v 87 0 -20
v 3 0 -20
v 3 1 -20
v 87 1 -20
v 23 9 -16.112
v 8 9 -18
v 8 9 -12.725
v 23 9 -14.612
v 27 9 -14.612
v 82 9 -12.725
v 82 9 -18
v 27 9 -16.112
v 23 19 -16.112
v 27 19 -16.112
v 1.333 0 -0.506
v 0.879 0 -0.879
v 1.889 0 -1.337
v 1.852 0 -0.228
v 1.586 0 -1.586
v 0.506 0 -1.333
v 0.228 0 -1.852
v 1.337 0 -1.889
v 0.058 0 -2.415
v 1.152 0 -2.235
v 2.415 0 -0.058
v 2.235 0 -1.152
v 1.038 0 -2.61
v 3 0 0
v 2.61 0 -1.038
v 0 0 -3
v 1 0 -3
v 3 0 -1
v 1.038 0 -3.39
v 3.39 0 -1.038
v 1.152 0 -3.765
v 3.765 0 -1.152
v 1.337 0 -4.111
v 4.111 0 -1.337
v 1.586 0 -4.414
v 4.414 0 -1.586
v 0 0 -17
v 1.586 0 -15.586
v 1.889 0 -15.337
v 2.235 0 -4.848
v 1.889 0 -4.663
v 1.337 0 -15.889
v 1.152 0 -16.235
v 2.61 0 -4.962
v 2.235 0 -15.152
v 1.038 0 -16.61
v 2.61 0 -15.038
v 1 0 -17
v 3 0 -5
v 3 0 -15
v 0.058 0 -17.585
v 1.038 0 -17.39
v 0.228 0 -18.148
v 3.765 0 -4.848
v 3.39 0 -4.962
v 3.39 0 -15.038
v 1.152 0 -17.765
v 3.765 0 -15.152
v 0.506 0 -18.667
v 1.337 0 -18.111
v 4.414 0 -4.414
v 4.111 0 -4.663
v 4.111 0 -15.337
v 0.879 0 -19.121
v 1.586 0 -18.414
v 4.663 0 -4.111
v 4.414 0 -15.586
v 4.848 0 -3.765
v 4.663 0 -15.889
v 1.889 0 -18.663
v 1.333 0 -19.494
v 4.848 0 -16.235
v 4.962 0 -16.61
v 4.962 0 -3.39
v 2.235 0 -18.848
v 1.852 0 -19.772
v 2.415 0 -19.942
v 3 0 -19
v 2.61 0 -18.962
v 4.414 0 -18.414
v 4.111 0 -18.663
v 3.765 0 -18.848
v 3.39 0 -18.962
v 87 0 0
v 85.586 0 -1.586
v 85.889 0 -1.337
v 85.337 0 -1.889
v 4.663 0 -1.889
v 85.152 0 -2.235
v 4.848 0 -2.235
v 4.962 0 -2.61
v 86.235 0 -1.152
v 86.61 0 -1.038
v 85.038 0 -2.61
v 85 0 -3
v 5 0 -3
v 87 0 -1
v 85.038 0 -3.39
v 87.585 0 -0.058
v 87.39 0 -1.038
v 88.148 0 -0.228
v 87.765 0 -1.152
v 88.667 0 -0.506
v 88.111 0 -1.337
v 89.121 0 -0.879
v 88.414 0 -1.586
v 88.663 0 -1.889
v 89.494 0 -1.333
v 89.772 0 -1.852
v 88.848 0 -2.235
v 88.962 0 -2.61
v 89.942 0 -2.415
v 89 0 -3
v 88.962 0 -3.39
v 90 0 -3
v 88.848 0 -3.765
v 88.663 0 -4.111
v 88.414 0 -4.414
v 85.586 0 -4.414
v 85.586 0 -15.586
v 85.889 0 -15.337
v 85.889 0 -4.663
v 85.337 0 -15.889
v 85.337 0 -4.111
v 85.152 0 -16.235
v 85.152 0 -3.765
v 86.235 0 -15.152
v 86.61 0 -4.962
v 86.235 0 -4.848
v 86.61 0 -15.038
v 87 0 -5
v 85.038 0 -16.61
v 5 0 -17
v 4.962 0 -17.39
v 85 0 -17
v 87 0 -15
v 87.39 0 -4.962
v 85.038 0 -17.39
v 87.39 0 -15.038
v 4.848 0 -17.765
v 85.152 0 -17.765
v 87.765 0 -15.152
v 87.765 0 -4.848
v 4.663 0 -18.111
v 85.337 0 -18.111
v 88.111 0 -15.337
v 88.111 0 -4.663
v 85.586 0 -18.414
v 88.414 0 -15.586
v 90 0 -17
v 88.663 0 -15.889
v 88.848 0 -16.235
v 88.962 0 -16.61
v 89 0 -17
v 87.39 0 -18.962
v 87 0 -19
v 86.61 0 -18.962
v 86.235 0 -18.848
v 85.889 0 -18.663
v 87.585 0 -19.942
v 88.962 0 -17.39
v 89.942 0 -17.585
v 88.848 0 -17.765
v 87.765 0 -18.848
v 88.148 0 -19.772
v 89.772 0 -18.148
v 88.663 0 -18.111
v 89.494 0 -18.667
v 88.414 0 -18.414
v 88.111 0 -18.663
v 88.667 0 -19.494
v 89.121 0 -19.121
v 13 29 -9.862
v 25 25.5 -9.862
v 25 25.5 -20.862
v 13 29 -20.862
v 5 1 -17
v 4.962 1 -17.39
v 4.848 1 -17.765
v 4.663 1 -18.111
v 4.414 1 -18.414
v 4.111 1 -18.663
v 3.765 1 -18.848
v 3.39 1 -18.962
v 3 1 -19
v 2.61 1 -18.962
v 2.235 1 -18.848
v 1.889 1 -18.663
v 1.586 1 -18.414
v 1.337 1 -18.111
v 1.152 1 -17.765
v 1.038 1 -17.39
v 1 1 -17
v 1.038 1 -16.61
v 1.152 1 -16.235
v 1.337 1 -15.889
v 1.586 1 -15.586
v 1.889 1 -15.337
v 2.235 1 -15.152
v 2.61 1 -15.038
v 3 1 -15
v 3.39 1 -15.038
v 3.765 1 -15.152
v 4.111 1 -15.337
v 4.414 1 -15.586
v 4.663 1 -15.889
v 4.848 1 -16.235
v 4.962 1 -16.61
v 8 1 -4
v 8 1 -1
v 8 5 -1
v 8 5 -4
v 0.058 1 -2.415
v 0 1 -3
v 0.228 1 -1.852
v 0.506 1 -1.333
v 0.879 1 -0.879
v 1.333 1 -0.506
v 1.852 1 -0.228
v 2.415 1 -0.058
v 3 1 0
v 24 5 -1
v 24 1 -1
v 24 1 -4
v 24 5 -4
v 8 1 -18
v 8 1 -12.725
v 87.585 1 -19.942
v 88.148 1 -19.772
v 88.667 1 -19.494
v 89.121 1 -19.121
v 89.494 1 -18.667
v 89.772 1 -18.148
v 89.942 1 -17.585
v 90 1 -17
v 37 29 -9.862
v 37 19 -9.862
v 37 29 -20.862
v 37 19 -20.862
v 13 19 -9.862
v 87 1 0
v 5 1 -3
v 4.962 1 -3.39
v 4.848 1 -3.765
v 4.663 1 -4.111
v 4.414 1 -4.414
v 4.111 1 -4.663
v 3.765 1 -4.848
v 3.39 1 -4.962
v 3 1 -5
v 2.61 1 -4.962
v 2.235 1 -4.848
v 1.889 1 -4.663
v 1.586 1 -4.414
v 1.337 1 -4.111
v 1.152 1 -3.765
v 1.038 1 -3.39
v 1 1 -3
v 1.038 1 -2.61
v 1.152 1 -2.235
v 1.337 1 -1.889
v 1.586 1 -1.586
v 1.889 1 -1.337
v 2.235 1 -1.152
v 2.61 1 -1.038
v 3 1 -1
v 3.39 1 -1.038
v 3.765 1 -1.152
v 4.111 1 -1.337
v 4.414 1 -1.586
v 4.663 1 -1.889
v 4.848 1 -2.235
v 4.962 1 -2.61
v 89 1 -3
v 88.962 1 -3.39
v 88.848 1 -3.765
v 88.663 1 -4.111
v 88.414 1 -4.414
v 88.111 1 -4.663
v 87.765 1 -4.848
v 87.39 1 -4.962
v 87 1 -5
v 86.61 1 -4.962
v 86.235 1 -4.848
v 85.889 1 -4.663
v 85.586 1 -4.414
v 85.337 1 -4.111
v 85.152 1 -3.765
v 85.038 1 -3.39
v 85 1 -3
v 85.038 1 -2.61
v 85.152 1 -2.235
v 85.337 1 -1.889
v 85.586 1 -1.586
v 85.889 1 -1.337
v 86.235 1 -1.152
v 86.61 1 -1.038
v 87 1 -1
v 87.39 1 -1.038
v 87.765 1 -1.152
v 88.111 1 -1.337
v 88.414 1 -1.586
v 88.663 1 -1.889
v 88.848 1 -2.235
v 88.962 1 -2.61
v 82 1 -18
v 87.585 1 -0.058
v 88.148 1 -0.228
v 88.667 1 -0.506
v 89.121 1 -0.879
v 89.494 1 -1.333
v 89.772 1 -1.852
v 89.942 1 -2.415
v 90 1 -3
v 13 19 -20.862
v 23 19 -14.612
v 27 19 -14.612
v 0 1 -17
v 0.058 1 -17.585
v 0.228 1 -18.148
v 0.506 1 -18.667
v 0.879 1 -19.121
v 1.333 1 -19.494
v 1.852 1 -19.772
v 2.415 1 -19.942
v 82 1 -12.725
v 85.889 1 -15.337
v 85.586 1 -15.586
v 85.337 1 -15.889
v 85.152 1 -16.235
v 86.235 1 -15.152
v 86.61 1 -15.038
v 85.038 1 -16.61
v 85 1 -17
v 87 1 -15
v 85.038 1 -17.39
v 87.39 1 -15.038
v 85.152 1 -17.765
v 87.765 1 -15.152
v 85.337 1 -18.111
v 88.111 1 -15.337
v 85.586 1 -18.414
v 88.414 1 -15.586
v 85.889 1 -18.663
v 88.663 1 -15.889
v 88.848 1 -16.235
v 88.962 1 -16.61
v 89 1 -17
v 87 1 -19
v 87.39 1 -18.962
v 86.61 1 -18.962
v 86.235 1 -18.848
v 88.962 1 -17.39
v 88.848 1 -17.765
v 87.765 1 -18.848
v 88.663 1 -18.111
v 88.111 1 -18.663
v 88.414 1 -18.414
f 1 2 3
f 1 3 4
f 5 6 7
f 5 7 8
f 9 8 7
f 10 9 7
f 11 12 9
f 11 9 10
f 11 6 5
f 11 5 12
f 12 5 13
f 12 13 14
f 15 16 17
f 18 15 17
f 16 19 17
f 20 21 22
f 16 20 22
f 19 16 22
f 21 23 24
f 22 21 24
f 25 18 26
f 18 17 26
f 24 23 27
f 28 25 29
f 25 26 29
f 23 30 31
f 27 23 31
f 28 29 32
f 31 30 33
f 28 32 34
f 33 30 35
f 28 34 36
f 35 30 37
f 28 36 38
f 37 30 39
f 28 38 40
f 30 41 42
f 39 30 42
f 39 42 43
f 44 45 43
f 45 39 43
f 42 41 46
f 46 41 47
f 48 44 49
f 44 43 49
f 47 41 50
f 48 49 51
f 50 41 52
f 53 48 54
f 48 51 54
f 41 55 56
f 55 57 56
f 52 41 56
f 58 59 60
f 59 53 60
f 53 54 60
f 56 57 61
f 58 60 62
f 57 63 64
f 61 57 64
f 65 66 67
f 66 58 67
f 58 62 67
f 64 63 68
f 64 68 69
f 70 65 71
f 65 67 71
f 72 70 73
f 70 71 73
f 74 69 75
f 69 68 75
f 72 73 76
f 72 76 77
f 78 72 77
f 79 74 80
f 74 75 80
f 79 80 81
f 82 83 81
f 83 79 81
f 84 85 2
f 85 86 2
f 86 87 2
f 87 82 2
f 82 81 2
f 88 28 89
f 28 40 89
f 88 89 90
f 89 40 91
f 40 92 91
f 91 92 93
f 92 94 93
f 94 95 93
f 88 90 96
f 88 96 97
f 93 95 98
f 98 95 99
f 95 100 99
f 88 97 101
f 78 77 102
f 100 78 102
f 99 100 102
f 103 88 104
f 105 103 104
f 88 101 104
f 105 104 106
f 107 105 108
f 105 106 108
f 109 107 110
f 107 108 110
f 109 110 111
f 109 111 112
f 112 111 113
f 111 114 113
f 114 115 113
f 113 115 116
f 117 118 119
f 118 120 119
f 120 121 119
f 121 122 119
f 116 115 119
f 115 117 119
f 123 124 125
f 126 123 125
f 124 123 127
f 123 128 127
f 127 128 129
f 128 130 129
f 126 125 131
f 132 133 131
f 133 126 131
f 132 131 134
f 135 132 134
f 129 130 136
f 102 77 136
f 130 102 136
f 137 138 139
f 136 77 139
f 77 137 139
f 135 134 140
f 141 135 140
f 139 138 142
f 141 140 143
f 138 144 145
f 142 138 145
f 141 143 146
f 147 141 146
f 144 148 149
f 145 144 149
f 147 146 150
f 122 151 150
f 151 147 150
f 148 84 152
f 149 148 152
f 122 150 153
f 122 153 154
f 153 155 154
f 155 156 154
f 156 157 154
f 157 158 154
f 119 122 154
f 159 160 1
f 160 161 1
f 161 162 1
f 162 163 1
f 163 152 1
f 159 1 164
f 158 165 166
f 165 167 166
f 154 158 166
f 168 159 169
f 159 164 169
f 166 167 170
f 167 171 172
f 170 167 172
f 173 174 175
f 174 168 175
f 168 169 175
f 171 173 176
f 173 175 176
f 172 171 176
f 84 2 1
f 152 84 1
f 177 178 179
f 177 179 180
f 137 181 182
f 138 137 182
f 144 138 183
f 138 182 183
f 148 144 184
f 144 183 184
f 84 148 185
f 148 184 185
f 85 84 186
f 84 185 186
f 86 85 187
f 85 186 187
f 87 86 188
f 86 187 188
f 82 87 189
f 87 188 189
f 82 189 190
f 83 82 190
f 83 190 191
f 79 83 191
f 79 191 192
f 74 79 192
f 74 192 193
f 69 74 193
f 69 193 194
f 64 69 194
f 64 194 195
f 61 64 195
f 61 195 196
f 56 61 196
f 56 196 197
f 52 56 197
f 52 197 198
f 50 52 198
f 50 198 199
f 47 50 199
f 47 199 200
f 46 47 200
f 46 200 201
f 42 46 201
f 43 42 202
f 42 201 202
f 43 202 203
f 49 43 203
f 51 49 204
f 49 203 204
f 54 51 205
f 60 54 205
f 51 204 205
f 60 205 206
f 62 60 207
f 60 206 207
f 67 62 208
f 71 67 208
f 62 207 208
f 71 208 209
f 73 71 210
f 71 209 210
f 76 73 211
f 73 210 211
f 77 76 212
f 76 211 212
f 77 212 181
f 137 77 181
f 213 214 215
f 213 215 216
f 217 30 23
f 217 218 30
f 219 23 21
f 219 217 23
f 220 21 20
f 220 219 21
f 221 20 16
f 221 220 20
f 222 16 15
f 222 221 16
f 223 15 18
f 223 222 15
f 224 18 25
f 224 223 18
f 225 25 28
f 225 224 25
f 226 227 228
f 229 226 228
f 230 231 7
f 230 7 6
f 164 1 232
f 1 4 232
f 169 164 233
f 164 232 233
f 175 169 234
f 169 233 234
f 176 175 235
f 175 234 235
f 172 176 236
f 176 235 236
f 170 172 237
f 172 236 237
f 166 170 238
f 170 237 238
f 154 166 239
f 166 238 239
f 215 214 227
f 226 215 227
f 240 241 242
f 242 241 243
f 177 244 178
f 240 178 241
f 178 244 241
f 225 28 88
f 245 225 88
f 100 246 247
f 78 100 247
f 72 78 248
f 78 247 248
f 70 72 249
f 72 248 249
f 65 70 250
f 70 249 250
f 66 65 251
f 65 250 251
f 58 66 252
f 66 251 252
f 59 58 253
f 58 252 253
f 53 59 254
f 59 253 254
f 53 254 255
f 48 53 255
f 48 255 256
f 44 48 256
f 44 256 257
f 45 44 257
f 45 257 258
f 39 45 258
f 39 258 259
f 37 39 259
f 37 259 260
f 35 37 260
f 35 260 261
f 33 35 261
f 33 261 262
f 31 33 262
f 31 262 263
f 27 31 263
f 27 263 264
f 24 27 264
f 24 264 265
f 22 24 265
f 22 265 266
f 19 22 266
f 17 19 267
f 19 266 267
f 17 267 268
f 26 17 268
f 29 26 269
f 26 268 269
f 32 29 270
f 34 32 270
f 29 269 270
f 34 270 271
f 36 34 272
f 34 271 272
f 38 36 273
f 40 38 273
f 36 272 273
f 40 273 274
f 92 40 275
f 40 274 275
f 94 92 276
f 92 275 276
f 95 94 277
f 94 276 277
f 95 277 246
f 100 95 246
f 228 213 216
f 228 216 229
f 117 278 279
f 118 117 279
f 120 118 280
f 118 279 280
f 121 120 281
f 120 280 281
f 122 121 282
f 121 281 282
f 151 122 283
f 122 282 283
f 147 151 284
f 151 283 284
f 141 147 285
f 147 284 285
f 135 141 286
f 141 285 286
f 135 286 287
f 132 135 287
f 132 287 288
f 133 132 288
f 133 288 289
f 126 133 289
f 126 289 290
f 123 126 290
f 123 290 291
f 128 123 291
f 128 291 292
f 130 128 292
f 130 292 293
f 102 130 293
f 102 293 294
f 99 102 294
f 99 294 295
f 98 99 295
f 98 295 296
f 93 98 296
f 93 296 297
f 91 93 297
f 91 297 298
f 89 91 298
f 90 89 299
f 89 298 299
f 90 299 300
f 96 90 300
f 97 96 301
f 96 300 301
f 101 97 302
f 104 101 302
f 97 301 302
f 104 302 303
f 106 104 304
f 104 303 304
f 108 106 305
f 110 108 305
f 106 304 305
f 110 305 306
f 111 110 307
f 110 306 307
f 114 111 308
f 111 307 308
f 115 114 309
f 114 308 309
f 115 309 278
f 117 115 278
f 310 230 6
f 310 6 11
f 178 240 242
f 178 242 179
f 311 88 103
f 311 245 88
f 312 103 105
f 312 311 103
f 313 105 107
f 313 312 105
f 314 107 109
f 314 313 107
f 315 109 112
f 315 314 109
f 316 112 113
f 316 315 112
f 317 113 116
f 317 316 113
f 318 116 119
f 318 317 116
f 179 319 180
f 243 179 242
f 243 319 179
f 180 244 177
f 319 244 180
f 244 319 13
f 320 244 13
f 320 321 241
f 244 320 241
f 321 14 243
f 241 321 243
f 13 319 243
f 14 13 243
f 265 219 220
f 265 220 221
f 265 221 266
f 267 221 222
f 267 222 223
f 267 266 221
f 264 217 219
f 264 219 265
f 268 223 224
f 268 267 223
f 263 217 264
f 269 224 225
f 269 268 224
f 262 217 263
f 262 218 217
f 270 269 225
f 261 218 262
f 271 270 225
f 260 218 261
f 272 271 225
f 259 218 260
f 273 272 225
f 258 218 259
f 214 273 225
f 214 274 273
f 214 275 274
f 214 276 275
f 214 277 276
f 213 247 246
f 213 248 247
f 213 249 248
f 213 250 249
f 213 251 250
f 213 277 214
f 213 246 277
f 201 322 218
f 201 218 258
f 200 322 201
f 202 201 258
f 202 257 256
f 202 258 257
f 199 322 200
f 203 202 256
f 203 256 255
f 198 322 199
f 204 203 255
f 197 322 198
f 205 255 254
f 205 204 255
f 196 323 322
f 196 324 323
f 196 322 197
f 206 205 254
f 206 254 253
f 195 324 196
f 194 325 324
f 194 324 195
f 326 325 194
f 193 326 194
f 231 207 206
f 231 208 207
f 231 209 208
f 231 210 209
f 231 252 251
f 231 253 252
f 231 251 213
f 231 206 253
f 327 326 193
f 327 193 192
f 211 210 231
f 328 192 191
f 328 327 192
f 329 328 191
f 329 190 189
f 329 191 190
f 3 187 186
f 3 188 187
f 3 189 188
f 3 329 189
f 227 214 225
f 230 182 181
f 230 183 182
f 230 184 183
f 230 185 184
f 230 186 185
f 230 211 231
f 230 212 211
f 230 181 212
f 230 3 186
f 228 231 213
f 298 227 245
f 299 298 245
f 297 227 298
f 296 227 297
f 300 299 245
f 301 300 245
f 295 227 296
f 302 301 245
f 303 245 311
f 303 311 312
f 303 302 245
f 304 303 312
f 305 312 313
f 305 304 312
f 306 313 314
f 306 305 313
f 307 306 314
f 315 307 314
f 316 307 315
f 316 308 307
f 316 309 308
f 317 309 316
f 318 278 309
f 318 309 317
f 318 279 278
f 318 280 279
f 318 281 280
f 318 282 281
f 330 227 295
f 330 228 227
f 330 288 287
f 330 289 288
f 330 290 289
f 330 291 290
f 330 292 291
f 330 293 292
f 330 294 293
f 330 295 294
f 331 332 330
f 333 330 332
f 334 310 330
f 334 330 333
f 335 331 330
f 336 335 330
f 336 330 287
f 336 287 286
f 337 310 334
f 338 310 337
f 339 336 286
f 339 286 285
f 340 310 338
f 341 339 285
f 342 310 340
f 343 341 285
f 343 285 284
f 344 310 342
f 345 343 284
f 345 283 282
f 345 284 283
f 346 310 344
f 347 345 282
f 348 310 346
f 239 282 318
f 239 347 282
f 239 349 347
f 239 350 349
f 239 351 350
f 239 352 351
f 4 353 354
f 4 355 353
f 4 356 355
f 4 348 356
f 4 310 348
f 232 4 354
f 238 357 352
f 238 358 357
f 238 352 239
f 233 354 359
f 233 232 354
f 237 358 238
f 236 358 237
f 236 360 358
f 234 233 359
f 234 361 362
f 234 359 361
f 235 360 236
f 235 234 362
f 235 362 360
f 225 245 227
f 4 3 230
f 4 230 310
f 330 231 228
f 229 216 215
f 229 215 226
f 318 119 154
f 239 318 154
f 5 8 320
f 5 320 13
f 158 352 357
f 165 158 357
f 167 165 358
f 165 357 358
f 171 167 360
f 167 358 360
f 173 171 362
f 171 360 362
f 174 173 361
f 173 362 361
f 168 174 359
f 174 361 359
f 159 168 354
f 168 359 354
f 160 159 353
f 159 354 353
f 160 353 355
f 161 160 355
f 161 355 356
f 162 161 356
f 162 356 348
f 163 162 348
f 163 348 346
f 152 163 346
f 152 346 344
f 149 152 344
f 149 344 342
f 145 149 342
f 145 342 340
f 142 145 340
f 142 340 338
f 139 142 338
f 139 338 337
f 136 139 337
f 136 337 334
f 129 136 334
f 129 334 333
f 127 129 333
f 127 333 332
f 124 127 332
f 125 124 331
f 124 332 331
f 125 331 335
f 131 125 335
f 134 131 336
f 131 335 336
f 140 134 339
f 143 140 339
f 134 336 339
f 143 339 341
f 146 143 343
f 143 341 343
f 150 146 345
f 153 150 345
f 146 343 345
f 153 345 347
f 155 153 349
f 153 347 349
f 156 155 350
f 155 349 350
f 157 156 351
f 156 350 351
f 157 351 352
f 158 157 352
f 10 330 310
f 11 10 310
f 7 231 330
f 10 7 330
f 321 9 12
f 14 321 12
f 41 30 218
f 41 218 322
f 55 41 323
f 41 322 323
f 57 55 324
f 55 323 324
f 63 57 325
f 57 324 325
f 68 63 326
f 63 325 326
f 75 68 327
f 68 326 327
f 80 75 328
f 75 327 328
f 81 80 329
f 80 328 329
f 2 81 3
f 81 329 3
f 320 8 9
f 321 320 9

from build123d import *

# Parameters (mm, degrees)
SKETCH1_W           = 90
SKETCH1_H           = 20
BOSS_EXTRUDE1_DEPTH = 1
SKETCH2_R           = 2
CUT_EXTRUDE1_DEPTH  = 2
FILLET1_R           = 3
SKETCH3_W           = 74
SKETCH3_H           = 5.275339083
BOSS_EXTRUDE2_DEPTH = 8
SKETCH4_W           = 16
SKETCH4_H           = 3
BOSS_EXTRUDE3_DEPTH = 4
SKETCH5_W           = 4
SKETCH5_H           = 1.5
BOSS_EXTRUDE4_DEPTH = 10
SKETCH6_W           = 24
SKETCH6_H           = 11
BOSS_EXTRUDE5_DEPTH = 10
CUT_EXTRUDE2_DEPTH  = 12


with BuildPart() as part:
    # Sketch1 → Boss-Extrude1 (new body)
    with BuildSketch(Plane(origin=(0, 0, 0), x_dir=(1, 0, 0), z_dir=(0, 1, 0))):
        with Locations((45, 10)):
            Rectangle(SKETCH1_W, SKETCH1_H)
    extrude(amount=BOSS_EXTRUDE1_DEPTH)

    # Sketch2 → Cut-Extrude1 (cut, through all)
    with BuildSketch(Plane(origin=(0, 1, 0), x_dir=(1, 0, 0), z_dir=(0, 1, 0))):
        with Locations((3, 17)):
            Circle(SKETCH2_R)
        with Locations((87, 17)):
            Circle(SKETCH2_R)
        with Locations((87, 3)):
            Circle(SKETCH2_R)
        with Locations((3, 3)):
            Circle(SKETCH2_R)
    extrude(amount=-CUT_EXTRUDE1_DEPTH, mode=Mode.SUBTRACT)

    # Fillet1
    fillet1_edges = [part.edges().sort_by_distance(p)[0] for p in [
        (0, 0.5, -20),
        (90, 0.5, -20),
        (90, 0.5, 0),
        (0, 0.5, 0),
    ]]
    fillet(fillet1_edges, radius=FILLET1_R)

    # Sketch3 → Boss-Extrude2 (add)
    with BuildSketch(Plane(origin=(0, 1, 0), x_dir=(1, 0, 0), z_dir=(0, 1, 0))):
        with Locations((45, 15.362330459)):
            Rectangle(SKETCH3_W, SKETCH3_H)
    extrude(amount=BOSS_EXTRUDE2_DEPTH)

    # Sketch4 → Boss-Extrude3 (add)
    with BuildSketch(Plane(origin=(0, 1, 0), x_dir=(1, 0, 0), z_dir=(0, 1, 0))):
        with Locations((16, 2.5)):
            Rectangle(SKETCH4_W, SKETCH4_H)
    extrude(amount=BOSS_EXTRUDE3_DEPTH)

    # Sketch5 → Boss-Extrude4 (add)
    with BuildSketch(Plane(origin=(0, 9, 0), x_dir=(1, 0, 0), z_dir=(0, 1, 0))):
        with Locations((25, 15.362330459)):
            Rectangle(SKETCH5_W, SKETCH5_H)
    extrude(amount=BOSS_EXTRUDE4_DEPTH)

    # Sketch6 → Boss-Extrude5 (add)
    with BuildSketch(Plane(origin=(0, 19, 0), x_dir=(1, 0, 0), z_dir=(0, 1, 0))):
        with Locations((25, 15.362330459)):
            Rectangle(SKETCH6_W, SKETCH6_H)
    extrude(amount=BOSS_EXTRUDE5_DEPTH)

    # Sketch7 → Cut-Extrude2 (cut, through all)
    with BuildSketch(Plane.XY.offset(-9.862330459)):
        Polygon((37, 29), (25, 25.5), (13, 29), align=None)
    extrude(amount=-CUT_EXTRUDE2_DEPTH, mode=Mode.SUBTRACT)


solid = part.part
